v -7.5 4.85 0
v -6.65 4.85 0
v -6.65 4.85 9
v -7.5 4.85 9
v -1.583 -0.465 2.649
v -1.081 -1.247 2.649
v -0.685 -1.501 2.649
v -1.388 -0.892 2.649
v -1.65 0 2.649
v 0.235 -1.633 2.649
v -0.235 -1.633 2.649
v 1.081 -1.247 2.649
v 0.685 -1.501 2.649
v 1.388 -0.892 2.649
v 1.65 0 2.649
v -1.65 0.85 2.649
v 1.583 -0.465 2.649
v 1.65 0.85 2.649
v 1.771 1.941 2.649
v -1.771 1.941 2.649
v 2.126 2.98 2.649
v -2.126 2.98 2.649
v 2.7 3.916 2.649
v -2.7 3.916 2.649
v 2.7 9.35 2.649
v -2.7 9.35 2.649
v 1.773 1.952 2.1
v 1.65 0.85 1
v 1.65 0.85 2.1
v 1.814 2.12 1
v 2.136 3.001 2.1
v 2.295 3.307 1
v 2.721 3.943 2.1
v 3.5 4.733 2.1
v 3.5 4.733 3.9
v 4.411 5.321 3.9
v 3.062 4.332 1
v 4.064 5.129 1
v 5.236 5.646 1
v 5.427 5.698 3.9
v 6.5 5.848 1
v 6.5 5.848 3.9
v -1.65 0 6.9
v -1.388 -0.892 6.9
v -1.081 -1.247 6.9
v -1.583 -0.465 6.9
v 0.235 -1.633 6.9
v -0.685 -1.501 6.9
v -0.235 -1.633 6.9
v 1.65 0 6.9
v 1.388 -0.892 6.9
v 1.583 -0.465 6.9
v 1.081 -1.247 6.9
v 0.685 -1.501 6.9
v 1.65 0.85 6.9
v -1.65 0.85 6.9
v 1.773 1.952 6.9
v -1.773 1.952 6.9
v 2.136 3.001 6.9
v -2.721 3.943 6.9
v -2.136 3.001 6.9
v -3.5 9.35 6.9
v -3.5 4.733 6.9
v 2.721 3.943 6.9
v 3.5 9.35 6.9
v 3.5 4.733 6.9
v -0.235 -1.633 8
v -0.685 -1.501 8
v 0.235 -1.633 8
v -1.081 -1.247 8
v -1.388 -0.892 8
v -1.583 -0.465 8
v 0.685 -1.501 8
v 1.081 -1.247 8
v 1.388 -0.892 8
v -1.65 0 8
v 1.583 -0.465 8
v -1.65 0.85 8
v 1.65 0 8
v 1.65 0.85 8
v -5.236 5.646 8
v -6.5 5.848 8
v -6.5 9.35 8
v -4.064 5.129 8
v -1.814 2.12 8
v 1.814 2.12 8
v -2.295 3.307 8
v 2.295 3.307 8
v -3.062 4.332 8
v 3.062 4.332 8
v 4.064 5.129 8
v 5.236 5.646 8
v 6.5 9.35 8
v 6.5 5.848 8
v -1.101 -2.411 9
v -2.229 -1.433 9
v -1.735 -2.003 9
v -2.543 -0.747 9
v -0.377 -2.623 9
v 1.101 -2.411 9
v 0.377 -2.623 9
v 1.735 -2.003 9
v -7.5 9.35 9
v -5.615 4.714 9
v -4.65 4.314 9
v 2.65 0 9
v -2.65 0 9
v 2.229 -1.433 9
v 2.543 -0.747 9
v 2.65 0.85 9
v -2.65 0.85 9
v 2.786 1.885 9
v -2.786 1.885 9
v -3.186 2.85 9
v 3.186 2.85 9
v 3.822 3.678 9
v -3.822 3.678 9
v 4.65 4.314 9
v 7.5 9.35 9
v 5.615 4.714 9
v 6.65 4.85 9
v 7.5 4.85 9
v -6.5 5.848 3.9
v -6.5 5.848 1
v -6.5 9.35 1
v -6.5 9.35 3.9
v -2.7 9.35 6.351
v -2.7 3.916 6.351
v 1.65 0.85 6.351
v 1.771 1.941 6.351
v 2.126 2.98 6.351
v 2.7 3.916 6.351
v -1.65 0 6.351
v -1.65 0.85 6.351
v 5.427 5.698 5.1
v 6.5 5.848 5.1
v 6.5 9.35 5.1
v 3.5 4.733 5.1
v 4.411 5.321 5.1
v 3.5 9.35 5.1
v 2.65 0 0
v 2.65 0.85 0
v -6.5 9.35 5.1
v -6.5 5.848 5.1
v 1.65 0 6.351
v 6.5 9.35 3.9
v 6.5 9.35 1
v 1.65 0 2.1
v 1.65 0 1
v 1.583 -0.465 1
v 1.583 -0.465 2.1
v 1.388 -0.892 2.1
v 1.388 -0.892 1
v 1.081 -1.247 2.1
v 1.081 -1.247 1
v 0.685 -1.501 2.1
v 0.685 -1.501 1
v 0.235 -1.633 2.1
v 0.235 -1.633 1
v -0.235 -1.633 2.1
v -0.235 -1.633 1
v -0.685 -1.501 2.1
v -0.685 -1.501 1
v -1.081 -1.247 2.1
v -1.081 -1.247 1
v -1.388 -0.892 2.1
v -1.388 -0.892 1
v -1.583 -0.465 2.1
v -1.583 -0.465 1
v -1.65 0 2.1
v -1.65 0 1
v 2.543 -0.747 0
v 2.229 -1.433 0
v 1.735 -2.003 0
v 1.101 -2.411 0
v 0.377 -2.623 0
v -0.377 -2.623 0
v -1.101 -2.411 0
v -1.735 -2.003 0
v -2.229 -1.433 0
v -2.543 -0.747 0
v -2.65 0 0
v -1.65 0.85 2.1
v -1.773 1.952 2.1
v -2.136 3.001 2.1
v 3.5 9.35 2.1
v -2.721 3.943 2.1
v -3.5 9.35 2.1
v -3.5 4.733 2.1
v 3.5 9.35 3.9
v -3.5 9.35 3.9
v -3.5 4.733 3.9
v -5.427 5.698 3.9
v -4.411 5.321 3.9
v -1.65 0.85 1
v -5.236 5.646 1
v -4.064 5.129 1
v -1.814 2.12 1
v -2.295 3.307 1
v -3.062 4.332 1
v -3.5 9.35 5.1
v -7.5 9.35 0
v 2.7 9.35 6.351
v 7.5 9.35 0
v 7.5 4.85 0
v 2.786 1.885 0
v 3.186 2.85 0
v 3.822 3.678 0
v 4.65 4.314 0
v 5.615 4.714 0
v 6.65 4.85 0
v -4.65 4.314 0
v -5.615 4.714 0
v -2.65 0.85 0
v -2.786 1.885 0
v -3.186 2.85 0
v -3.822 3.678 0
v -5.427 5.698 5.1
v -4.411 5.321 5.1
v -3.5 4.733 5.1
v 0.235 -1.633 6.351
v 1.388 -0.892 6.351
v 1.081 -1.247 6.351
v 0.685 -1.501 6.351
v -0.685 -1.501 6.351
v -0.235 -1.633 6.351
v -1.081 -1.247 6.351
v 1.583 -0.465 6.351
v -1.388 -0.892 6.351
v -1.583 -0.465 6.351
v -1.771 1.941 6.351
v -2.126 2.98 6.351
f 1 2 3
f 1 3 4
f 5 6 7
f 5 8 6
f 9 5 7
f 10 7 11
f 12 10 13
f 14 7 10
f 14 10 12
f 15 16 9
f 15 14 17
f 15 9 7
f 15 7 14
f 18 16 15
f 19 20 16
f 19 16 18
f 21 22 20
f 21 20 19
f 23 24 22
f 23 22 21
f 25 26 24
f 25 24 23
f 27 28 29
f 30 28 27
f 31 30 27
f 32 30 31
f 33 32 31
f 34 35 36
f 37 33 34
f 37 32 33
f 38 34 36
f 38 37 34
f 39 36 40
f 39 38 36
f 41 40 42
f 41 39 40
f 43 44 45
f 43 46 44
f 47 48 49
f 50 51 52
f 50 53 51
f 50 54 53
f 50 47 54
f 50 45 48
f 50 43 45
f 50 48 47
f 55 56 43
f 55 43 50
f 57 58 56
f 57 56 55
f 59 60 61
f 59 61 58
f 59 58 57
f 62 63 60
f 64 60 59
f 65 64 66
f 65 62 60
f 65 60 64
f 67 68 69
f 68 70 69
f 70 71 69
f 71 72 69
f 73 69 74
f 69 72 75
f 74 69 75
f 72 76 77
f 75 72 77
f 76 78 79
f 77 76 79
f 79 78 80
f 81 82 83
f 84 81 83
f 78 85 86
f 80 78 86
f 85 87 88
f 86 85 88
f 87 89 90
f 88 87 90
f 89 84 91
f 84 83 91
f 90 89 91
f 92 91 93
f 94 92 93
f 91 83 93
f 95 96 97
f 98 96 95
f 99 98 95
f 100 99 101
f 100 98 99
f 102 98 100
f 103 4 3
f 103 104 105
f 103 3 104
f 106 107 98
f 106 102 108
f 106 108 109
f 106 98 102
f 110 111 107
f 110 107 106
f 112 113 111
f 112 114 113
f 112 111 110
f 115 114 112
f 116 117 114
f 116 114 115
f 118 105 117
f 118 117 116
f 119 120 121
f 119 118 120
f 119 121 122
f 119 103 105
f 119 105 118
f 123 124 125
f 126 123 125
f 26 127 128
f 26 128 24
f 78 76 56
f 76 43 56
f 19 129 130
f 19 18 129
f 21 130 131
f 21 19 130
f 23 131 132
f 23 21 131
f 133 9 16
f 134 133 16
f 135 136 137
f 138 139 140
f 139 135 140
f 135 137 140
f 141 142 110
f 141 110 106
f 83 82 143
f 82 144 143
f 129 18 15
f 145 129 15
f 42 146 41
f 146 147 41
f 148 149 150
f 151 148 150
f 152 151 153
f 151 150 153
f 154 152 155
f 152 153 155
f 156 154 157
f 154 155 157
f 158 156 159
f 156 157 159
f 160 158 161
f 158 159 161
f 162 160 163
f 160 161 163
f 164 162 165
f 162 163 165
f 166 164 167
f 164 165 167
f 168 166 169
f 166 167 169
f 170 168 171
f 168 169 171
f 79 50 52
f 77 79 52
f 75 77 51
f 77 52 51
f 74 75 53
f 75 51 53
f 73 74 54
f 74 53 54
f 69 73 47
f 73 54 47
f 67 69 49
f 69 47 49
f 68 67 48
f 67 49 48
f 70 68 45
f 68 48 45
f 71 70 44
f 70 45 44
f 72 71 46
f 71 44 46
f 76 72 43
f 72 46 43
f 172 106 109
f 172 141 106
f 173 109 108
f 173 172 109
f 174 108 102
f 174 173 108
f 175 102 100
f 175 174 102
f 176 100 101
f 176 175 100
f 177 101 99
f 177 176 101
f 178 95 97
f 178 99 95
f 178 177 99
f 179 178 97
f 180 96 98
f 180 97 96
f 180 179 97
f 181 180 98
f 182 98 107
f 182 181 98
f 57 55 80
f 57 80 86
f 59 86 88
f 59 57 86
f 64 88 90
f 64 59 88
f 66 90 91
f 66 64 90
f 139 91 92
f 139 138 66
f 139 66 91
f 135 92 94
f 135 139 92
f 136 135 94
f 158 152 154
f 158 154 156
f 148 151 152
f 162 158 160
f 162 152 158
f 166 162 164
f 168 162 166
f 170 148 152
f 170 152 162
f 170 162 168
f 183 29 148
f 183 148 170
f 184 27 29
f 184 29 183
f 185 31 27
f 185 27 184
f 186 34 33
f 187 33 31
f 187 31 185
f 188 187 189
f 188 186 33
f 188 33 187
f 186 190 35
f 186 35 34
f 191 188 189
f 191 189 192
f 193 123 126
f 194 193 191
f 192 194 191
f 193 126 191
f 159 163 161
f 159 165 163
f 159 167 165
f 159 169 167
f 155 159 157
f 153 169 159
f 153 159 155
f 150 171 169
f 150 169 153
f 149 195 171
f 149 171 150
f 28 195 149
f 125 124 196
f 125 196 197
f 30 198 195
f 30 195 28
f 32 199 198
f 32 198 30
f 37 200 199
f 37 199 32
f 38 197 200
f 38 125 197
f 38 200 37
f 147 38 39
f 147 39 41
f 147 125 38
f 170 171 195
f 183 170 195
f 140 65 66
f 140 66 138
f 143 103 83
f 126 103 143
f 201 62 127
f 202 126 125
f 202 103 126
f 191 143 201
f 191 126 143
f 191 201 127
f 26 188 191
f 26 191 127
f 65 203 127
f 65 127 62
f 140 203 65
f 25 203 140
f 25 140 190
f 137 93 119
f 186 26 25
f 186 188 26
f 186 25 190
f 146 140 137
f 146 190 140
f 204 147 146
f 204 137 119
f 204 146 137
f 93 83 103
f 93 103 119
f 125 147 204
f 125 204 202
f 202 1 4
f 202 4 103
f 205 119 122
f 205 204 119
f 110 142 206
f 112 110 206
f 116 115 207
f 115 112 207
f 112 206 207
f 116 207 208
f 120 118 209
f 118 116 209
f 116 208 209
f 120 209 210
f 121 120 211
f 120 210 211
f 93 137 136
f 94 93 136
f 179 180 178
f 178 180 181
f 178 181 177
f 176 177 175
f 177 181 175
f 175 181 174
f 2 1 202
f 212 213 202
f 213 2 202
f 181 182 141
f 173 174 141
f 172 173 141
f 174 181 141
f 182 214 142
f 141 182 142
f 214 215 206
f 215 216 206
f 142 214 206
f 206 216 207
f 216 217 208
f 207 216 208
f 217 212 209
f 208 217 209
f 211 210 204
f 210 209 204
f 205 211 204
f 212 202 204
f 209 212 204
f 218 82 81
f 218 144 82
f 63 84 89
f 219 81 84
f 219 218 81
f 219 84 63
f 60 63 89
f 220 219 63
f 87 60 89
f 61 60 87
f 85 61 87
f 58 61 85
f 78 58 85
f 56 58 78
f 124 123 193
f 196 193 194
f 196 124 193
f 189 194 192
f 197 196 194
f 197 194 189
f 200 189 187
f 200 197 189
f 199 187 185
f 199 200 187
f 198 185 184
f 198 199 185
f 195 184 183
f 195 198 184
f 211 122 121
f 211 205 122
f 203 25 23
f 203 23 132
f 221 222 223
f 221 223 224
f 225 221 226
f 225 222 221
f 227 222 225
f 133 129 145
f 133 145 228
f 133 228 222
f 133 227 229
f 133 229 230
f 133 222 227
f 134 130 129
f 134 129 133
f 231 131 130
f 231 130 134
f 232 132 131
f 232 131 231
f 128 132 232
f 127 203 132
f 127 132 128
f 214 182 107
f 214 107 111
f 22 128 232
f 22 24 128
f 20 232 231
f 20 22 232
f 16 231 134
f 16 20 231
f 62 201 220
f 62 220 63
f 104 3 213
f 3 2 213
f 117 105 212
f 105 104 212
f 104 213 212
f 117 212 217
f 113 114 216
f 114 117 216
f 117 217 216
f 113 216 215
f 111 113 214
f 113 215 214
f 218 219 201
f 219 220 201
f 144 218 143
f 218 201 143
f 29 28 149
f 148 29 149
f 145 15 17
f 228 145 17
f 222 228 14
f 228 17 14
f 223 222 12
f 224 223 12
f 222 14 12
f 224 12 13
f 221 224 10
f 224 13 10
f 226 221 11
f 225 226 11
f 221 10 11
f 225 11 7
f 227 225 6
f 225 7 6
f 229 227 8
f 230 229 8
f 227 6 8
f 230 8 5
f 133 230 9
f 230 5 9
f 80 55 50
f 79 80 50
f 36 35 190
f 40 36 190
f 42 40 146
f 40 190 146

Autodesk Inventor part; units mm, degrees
ref_plane "YZ Plane" through (0, 0, 0) normal (1, 0, 0) x (0, 1, 0)
ref_plane "XZ Plane" through (0, 0, 0) normal (0, 1, 0) x (-1, 0, 0)
ref_plane "XY Plane" through (0, 0, 0) normal (0, 0, 1) x (1, 0, 0)
sketch "Sketch1" plane through (0, 0, 0) normal (0, 0, 1) x (1, 0, 0)
  arc A0 (-2.65, 0) -> (2.65, 0) centre (0, 0) ccw
  line L0 (-7.5, 9.35) -> (7.5, 9.35)
  line L1 (7.5, 9.35) -> (7.5, 4.85)
  line L2 (-7.5, 4.85) -> (-7.5, 9.35)
  line L3 (-2.65, 0) -> (-2.65, 0.85)
  line L4 (2.65, 0.85) -> (2.65, 0)
  line L5 (7.5, 4.85) -> (6.65, 4.85)
  line L6 (-6.65, 4.85) -> (-7.5, 4.85)
  line L7 (0, 0) -> (0, 9.35) construction
  arc A1 (-2.65, 0.85) -> (-6.65, 4.85) centre (-6.65, 0.85) ccw
  arc A2 (6.65, 4.85) -> (2.65, 0.85) centre (6.65, 0.85) ccw
  dimension "d0" = 2.65
  dimension "d1" = 4.5
  dimension "d2" = 15
  dimension "d3" = 12
  dimension "d4" = 4
extrude "Extrusion1" add sketch "Sketch1" along normal blind 9
shell "Shell1" thickness 1 removed faces 1 at (-2.5, 9.35, 3)
sketch "Sketch3" plane through (-7.5, 9.35, 0) normal (0, 1, 0) x (1, 0, 0)
  line L0 (1, -5.1) -> (1, -3.9)
  line L1 (14, -3.9) -> (14, -5.1)
  line L2 (11, -2.1) -> (4, -2.1)
  line L3 (4, -6.9) -> (11, -6.9)
  line L4 (11, -2.1) -> (4, -6.9) construction
  line L5 (4, -2.1) -> (11, -6.9) construction
  line L6 (14, -5.1) -> (11, -5.1)
  line L7 (4, -5.1) -> (1, -5.1)
  line L8 (1, -3.9) -> (4, -3.9)
  line L9 (11, -3.9) -> (14, -3.9)
  line L10 (4, -2.1) -> (4, -3.9)
  line L11 (4, -5.1) -> (4, -6.9)
  line L12 (11, -6.9) -> (11, -5.1)
  line L13 (11, -3.9) -> (11, -2.1)
  line L14 (14, -1) -> (14, -8) projected
  line L15 (1, -8) -> (1, -1) projected
  line L16 (14, -8) -> (1, -8) projected
  line L17 (7.5, -8) -> (7.5, -4.5) construction
  line L18 (1, -1) -> (14, -1) projected
  line L19 (7.5, -1) -> (7.5, -4.5) construction
  line L20 (4.8, -2.6486) -> (10.2, -2.6486)
  line L21 (10.2, -2.6486) -> (10.2, -6.3514)
  line L22 (10.2, -6.3514) -> (4.8, -6.3514)
  line L23 (4.8, -6.3514) -> (4.8, -2.6486)
  line L24 (4.8, -2.6486) -> (10.2, -6.3514) construction
  line L25 (10.2, -2.6486) -> (4.8, -6.3514) construction
  point P0 (7.5, 0)
  dimension "d8" = 1.2
  dimension "d9" = 7
  dimension "d10" = 4.8
  dimension "d11" = 0.8
extrude "Extrusion2" add sketch "Sketch3" against normal up to next contours L0 L8 L10 L2 L13 L9 L1 L6 L12 L3 L11 L7
properties part number "Boton de temperaturas" material "ABS Plastic"
